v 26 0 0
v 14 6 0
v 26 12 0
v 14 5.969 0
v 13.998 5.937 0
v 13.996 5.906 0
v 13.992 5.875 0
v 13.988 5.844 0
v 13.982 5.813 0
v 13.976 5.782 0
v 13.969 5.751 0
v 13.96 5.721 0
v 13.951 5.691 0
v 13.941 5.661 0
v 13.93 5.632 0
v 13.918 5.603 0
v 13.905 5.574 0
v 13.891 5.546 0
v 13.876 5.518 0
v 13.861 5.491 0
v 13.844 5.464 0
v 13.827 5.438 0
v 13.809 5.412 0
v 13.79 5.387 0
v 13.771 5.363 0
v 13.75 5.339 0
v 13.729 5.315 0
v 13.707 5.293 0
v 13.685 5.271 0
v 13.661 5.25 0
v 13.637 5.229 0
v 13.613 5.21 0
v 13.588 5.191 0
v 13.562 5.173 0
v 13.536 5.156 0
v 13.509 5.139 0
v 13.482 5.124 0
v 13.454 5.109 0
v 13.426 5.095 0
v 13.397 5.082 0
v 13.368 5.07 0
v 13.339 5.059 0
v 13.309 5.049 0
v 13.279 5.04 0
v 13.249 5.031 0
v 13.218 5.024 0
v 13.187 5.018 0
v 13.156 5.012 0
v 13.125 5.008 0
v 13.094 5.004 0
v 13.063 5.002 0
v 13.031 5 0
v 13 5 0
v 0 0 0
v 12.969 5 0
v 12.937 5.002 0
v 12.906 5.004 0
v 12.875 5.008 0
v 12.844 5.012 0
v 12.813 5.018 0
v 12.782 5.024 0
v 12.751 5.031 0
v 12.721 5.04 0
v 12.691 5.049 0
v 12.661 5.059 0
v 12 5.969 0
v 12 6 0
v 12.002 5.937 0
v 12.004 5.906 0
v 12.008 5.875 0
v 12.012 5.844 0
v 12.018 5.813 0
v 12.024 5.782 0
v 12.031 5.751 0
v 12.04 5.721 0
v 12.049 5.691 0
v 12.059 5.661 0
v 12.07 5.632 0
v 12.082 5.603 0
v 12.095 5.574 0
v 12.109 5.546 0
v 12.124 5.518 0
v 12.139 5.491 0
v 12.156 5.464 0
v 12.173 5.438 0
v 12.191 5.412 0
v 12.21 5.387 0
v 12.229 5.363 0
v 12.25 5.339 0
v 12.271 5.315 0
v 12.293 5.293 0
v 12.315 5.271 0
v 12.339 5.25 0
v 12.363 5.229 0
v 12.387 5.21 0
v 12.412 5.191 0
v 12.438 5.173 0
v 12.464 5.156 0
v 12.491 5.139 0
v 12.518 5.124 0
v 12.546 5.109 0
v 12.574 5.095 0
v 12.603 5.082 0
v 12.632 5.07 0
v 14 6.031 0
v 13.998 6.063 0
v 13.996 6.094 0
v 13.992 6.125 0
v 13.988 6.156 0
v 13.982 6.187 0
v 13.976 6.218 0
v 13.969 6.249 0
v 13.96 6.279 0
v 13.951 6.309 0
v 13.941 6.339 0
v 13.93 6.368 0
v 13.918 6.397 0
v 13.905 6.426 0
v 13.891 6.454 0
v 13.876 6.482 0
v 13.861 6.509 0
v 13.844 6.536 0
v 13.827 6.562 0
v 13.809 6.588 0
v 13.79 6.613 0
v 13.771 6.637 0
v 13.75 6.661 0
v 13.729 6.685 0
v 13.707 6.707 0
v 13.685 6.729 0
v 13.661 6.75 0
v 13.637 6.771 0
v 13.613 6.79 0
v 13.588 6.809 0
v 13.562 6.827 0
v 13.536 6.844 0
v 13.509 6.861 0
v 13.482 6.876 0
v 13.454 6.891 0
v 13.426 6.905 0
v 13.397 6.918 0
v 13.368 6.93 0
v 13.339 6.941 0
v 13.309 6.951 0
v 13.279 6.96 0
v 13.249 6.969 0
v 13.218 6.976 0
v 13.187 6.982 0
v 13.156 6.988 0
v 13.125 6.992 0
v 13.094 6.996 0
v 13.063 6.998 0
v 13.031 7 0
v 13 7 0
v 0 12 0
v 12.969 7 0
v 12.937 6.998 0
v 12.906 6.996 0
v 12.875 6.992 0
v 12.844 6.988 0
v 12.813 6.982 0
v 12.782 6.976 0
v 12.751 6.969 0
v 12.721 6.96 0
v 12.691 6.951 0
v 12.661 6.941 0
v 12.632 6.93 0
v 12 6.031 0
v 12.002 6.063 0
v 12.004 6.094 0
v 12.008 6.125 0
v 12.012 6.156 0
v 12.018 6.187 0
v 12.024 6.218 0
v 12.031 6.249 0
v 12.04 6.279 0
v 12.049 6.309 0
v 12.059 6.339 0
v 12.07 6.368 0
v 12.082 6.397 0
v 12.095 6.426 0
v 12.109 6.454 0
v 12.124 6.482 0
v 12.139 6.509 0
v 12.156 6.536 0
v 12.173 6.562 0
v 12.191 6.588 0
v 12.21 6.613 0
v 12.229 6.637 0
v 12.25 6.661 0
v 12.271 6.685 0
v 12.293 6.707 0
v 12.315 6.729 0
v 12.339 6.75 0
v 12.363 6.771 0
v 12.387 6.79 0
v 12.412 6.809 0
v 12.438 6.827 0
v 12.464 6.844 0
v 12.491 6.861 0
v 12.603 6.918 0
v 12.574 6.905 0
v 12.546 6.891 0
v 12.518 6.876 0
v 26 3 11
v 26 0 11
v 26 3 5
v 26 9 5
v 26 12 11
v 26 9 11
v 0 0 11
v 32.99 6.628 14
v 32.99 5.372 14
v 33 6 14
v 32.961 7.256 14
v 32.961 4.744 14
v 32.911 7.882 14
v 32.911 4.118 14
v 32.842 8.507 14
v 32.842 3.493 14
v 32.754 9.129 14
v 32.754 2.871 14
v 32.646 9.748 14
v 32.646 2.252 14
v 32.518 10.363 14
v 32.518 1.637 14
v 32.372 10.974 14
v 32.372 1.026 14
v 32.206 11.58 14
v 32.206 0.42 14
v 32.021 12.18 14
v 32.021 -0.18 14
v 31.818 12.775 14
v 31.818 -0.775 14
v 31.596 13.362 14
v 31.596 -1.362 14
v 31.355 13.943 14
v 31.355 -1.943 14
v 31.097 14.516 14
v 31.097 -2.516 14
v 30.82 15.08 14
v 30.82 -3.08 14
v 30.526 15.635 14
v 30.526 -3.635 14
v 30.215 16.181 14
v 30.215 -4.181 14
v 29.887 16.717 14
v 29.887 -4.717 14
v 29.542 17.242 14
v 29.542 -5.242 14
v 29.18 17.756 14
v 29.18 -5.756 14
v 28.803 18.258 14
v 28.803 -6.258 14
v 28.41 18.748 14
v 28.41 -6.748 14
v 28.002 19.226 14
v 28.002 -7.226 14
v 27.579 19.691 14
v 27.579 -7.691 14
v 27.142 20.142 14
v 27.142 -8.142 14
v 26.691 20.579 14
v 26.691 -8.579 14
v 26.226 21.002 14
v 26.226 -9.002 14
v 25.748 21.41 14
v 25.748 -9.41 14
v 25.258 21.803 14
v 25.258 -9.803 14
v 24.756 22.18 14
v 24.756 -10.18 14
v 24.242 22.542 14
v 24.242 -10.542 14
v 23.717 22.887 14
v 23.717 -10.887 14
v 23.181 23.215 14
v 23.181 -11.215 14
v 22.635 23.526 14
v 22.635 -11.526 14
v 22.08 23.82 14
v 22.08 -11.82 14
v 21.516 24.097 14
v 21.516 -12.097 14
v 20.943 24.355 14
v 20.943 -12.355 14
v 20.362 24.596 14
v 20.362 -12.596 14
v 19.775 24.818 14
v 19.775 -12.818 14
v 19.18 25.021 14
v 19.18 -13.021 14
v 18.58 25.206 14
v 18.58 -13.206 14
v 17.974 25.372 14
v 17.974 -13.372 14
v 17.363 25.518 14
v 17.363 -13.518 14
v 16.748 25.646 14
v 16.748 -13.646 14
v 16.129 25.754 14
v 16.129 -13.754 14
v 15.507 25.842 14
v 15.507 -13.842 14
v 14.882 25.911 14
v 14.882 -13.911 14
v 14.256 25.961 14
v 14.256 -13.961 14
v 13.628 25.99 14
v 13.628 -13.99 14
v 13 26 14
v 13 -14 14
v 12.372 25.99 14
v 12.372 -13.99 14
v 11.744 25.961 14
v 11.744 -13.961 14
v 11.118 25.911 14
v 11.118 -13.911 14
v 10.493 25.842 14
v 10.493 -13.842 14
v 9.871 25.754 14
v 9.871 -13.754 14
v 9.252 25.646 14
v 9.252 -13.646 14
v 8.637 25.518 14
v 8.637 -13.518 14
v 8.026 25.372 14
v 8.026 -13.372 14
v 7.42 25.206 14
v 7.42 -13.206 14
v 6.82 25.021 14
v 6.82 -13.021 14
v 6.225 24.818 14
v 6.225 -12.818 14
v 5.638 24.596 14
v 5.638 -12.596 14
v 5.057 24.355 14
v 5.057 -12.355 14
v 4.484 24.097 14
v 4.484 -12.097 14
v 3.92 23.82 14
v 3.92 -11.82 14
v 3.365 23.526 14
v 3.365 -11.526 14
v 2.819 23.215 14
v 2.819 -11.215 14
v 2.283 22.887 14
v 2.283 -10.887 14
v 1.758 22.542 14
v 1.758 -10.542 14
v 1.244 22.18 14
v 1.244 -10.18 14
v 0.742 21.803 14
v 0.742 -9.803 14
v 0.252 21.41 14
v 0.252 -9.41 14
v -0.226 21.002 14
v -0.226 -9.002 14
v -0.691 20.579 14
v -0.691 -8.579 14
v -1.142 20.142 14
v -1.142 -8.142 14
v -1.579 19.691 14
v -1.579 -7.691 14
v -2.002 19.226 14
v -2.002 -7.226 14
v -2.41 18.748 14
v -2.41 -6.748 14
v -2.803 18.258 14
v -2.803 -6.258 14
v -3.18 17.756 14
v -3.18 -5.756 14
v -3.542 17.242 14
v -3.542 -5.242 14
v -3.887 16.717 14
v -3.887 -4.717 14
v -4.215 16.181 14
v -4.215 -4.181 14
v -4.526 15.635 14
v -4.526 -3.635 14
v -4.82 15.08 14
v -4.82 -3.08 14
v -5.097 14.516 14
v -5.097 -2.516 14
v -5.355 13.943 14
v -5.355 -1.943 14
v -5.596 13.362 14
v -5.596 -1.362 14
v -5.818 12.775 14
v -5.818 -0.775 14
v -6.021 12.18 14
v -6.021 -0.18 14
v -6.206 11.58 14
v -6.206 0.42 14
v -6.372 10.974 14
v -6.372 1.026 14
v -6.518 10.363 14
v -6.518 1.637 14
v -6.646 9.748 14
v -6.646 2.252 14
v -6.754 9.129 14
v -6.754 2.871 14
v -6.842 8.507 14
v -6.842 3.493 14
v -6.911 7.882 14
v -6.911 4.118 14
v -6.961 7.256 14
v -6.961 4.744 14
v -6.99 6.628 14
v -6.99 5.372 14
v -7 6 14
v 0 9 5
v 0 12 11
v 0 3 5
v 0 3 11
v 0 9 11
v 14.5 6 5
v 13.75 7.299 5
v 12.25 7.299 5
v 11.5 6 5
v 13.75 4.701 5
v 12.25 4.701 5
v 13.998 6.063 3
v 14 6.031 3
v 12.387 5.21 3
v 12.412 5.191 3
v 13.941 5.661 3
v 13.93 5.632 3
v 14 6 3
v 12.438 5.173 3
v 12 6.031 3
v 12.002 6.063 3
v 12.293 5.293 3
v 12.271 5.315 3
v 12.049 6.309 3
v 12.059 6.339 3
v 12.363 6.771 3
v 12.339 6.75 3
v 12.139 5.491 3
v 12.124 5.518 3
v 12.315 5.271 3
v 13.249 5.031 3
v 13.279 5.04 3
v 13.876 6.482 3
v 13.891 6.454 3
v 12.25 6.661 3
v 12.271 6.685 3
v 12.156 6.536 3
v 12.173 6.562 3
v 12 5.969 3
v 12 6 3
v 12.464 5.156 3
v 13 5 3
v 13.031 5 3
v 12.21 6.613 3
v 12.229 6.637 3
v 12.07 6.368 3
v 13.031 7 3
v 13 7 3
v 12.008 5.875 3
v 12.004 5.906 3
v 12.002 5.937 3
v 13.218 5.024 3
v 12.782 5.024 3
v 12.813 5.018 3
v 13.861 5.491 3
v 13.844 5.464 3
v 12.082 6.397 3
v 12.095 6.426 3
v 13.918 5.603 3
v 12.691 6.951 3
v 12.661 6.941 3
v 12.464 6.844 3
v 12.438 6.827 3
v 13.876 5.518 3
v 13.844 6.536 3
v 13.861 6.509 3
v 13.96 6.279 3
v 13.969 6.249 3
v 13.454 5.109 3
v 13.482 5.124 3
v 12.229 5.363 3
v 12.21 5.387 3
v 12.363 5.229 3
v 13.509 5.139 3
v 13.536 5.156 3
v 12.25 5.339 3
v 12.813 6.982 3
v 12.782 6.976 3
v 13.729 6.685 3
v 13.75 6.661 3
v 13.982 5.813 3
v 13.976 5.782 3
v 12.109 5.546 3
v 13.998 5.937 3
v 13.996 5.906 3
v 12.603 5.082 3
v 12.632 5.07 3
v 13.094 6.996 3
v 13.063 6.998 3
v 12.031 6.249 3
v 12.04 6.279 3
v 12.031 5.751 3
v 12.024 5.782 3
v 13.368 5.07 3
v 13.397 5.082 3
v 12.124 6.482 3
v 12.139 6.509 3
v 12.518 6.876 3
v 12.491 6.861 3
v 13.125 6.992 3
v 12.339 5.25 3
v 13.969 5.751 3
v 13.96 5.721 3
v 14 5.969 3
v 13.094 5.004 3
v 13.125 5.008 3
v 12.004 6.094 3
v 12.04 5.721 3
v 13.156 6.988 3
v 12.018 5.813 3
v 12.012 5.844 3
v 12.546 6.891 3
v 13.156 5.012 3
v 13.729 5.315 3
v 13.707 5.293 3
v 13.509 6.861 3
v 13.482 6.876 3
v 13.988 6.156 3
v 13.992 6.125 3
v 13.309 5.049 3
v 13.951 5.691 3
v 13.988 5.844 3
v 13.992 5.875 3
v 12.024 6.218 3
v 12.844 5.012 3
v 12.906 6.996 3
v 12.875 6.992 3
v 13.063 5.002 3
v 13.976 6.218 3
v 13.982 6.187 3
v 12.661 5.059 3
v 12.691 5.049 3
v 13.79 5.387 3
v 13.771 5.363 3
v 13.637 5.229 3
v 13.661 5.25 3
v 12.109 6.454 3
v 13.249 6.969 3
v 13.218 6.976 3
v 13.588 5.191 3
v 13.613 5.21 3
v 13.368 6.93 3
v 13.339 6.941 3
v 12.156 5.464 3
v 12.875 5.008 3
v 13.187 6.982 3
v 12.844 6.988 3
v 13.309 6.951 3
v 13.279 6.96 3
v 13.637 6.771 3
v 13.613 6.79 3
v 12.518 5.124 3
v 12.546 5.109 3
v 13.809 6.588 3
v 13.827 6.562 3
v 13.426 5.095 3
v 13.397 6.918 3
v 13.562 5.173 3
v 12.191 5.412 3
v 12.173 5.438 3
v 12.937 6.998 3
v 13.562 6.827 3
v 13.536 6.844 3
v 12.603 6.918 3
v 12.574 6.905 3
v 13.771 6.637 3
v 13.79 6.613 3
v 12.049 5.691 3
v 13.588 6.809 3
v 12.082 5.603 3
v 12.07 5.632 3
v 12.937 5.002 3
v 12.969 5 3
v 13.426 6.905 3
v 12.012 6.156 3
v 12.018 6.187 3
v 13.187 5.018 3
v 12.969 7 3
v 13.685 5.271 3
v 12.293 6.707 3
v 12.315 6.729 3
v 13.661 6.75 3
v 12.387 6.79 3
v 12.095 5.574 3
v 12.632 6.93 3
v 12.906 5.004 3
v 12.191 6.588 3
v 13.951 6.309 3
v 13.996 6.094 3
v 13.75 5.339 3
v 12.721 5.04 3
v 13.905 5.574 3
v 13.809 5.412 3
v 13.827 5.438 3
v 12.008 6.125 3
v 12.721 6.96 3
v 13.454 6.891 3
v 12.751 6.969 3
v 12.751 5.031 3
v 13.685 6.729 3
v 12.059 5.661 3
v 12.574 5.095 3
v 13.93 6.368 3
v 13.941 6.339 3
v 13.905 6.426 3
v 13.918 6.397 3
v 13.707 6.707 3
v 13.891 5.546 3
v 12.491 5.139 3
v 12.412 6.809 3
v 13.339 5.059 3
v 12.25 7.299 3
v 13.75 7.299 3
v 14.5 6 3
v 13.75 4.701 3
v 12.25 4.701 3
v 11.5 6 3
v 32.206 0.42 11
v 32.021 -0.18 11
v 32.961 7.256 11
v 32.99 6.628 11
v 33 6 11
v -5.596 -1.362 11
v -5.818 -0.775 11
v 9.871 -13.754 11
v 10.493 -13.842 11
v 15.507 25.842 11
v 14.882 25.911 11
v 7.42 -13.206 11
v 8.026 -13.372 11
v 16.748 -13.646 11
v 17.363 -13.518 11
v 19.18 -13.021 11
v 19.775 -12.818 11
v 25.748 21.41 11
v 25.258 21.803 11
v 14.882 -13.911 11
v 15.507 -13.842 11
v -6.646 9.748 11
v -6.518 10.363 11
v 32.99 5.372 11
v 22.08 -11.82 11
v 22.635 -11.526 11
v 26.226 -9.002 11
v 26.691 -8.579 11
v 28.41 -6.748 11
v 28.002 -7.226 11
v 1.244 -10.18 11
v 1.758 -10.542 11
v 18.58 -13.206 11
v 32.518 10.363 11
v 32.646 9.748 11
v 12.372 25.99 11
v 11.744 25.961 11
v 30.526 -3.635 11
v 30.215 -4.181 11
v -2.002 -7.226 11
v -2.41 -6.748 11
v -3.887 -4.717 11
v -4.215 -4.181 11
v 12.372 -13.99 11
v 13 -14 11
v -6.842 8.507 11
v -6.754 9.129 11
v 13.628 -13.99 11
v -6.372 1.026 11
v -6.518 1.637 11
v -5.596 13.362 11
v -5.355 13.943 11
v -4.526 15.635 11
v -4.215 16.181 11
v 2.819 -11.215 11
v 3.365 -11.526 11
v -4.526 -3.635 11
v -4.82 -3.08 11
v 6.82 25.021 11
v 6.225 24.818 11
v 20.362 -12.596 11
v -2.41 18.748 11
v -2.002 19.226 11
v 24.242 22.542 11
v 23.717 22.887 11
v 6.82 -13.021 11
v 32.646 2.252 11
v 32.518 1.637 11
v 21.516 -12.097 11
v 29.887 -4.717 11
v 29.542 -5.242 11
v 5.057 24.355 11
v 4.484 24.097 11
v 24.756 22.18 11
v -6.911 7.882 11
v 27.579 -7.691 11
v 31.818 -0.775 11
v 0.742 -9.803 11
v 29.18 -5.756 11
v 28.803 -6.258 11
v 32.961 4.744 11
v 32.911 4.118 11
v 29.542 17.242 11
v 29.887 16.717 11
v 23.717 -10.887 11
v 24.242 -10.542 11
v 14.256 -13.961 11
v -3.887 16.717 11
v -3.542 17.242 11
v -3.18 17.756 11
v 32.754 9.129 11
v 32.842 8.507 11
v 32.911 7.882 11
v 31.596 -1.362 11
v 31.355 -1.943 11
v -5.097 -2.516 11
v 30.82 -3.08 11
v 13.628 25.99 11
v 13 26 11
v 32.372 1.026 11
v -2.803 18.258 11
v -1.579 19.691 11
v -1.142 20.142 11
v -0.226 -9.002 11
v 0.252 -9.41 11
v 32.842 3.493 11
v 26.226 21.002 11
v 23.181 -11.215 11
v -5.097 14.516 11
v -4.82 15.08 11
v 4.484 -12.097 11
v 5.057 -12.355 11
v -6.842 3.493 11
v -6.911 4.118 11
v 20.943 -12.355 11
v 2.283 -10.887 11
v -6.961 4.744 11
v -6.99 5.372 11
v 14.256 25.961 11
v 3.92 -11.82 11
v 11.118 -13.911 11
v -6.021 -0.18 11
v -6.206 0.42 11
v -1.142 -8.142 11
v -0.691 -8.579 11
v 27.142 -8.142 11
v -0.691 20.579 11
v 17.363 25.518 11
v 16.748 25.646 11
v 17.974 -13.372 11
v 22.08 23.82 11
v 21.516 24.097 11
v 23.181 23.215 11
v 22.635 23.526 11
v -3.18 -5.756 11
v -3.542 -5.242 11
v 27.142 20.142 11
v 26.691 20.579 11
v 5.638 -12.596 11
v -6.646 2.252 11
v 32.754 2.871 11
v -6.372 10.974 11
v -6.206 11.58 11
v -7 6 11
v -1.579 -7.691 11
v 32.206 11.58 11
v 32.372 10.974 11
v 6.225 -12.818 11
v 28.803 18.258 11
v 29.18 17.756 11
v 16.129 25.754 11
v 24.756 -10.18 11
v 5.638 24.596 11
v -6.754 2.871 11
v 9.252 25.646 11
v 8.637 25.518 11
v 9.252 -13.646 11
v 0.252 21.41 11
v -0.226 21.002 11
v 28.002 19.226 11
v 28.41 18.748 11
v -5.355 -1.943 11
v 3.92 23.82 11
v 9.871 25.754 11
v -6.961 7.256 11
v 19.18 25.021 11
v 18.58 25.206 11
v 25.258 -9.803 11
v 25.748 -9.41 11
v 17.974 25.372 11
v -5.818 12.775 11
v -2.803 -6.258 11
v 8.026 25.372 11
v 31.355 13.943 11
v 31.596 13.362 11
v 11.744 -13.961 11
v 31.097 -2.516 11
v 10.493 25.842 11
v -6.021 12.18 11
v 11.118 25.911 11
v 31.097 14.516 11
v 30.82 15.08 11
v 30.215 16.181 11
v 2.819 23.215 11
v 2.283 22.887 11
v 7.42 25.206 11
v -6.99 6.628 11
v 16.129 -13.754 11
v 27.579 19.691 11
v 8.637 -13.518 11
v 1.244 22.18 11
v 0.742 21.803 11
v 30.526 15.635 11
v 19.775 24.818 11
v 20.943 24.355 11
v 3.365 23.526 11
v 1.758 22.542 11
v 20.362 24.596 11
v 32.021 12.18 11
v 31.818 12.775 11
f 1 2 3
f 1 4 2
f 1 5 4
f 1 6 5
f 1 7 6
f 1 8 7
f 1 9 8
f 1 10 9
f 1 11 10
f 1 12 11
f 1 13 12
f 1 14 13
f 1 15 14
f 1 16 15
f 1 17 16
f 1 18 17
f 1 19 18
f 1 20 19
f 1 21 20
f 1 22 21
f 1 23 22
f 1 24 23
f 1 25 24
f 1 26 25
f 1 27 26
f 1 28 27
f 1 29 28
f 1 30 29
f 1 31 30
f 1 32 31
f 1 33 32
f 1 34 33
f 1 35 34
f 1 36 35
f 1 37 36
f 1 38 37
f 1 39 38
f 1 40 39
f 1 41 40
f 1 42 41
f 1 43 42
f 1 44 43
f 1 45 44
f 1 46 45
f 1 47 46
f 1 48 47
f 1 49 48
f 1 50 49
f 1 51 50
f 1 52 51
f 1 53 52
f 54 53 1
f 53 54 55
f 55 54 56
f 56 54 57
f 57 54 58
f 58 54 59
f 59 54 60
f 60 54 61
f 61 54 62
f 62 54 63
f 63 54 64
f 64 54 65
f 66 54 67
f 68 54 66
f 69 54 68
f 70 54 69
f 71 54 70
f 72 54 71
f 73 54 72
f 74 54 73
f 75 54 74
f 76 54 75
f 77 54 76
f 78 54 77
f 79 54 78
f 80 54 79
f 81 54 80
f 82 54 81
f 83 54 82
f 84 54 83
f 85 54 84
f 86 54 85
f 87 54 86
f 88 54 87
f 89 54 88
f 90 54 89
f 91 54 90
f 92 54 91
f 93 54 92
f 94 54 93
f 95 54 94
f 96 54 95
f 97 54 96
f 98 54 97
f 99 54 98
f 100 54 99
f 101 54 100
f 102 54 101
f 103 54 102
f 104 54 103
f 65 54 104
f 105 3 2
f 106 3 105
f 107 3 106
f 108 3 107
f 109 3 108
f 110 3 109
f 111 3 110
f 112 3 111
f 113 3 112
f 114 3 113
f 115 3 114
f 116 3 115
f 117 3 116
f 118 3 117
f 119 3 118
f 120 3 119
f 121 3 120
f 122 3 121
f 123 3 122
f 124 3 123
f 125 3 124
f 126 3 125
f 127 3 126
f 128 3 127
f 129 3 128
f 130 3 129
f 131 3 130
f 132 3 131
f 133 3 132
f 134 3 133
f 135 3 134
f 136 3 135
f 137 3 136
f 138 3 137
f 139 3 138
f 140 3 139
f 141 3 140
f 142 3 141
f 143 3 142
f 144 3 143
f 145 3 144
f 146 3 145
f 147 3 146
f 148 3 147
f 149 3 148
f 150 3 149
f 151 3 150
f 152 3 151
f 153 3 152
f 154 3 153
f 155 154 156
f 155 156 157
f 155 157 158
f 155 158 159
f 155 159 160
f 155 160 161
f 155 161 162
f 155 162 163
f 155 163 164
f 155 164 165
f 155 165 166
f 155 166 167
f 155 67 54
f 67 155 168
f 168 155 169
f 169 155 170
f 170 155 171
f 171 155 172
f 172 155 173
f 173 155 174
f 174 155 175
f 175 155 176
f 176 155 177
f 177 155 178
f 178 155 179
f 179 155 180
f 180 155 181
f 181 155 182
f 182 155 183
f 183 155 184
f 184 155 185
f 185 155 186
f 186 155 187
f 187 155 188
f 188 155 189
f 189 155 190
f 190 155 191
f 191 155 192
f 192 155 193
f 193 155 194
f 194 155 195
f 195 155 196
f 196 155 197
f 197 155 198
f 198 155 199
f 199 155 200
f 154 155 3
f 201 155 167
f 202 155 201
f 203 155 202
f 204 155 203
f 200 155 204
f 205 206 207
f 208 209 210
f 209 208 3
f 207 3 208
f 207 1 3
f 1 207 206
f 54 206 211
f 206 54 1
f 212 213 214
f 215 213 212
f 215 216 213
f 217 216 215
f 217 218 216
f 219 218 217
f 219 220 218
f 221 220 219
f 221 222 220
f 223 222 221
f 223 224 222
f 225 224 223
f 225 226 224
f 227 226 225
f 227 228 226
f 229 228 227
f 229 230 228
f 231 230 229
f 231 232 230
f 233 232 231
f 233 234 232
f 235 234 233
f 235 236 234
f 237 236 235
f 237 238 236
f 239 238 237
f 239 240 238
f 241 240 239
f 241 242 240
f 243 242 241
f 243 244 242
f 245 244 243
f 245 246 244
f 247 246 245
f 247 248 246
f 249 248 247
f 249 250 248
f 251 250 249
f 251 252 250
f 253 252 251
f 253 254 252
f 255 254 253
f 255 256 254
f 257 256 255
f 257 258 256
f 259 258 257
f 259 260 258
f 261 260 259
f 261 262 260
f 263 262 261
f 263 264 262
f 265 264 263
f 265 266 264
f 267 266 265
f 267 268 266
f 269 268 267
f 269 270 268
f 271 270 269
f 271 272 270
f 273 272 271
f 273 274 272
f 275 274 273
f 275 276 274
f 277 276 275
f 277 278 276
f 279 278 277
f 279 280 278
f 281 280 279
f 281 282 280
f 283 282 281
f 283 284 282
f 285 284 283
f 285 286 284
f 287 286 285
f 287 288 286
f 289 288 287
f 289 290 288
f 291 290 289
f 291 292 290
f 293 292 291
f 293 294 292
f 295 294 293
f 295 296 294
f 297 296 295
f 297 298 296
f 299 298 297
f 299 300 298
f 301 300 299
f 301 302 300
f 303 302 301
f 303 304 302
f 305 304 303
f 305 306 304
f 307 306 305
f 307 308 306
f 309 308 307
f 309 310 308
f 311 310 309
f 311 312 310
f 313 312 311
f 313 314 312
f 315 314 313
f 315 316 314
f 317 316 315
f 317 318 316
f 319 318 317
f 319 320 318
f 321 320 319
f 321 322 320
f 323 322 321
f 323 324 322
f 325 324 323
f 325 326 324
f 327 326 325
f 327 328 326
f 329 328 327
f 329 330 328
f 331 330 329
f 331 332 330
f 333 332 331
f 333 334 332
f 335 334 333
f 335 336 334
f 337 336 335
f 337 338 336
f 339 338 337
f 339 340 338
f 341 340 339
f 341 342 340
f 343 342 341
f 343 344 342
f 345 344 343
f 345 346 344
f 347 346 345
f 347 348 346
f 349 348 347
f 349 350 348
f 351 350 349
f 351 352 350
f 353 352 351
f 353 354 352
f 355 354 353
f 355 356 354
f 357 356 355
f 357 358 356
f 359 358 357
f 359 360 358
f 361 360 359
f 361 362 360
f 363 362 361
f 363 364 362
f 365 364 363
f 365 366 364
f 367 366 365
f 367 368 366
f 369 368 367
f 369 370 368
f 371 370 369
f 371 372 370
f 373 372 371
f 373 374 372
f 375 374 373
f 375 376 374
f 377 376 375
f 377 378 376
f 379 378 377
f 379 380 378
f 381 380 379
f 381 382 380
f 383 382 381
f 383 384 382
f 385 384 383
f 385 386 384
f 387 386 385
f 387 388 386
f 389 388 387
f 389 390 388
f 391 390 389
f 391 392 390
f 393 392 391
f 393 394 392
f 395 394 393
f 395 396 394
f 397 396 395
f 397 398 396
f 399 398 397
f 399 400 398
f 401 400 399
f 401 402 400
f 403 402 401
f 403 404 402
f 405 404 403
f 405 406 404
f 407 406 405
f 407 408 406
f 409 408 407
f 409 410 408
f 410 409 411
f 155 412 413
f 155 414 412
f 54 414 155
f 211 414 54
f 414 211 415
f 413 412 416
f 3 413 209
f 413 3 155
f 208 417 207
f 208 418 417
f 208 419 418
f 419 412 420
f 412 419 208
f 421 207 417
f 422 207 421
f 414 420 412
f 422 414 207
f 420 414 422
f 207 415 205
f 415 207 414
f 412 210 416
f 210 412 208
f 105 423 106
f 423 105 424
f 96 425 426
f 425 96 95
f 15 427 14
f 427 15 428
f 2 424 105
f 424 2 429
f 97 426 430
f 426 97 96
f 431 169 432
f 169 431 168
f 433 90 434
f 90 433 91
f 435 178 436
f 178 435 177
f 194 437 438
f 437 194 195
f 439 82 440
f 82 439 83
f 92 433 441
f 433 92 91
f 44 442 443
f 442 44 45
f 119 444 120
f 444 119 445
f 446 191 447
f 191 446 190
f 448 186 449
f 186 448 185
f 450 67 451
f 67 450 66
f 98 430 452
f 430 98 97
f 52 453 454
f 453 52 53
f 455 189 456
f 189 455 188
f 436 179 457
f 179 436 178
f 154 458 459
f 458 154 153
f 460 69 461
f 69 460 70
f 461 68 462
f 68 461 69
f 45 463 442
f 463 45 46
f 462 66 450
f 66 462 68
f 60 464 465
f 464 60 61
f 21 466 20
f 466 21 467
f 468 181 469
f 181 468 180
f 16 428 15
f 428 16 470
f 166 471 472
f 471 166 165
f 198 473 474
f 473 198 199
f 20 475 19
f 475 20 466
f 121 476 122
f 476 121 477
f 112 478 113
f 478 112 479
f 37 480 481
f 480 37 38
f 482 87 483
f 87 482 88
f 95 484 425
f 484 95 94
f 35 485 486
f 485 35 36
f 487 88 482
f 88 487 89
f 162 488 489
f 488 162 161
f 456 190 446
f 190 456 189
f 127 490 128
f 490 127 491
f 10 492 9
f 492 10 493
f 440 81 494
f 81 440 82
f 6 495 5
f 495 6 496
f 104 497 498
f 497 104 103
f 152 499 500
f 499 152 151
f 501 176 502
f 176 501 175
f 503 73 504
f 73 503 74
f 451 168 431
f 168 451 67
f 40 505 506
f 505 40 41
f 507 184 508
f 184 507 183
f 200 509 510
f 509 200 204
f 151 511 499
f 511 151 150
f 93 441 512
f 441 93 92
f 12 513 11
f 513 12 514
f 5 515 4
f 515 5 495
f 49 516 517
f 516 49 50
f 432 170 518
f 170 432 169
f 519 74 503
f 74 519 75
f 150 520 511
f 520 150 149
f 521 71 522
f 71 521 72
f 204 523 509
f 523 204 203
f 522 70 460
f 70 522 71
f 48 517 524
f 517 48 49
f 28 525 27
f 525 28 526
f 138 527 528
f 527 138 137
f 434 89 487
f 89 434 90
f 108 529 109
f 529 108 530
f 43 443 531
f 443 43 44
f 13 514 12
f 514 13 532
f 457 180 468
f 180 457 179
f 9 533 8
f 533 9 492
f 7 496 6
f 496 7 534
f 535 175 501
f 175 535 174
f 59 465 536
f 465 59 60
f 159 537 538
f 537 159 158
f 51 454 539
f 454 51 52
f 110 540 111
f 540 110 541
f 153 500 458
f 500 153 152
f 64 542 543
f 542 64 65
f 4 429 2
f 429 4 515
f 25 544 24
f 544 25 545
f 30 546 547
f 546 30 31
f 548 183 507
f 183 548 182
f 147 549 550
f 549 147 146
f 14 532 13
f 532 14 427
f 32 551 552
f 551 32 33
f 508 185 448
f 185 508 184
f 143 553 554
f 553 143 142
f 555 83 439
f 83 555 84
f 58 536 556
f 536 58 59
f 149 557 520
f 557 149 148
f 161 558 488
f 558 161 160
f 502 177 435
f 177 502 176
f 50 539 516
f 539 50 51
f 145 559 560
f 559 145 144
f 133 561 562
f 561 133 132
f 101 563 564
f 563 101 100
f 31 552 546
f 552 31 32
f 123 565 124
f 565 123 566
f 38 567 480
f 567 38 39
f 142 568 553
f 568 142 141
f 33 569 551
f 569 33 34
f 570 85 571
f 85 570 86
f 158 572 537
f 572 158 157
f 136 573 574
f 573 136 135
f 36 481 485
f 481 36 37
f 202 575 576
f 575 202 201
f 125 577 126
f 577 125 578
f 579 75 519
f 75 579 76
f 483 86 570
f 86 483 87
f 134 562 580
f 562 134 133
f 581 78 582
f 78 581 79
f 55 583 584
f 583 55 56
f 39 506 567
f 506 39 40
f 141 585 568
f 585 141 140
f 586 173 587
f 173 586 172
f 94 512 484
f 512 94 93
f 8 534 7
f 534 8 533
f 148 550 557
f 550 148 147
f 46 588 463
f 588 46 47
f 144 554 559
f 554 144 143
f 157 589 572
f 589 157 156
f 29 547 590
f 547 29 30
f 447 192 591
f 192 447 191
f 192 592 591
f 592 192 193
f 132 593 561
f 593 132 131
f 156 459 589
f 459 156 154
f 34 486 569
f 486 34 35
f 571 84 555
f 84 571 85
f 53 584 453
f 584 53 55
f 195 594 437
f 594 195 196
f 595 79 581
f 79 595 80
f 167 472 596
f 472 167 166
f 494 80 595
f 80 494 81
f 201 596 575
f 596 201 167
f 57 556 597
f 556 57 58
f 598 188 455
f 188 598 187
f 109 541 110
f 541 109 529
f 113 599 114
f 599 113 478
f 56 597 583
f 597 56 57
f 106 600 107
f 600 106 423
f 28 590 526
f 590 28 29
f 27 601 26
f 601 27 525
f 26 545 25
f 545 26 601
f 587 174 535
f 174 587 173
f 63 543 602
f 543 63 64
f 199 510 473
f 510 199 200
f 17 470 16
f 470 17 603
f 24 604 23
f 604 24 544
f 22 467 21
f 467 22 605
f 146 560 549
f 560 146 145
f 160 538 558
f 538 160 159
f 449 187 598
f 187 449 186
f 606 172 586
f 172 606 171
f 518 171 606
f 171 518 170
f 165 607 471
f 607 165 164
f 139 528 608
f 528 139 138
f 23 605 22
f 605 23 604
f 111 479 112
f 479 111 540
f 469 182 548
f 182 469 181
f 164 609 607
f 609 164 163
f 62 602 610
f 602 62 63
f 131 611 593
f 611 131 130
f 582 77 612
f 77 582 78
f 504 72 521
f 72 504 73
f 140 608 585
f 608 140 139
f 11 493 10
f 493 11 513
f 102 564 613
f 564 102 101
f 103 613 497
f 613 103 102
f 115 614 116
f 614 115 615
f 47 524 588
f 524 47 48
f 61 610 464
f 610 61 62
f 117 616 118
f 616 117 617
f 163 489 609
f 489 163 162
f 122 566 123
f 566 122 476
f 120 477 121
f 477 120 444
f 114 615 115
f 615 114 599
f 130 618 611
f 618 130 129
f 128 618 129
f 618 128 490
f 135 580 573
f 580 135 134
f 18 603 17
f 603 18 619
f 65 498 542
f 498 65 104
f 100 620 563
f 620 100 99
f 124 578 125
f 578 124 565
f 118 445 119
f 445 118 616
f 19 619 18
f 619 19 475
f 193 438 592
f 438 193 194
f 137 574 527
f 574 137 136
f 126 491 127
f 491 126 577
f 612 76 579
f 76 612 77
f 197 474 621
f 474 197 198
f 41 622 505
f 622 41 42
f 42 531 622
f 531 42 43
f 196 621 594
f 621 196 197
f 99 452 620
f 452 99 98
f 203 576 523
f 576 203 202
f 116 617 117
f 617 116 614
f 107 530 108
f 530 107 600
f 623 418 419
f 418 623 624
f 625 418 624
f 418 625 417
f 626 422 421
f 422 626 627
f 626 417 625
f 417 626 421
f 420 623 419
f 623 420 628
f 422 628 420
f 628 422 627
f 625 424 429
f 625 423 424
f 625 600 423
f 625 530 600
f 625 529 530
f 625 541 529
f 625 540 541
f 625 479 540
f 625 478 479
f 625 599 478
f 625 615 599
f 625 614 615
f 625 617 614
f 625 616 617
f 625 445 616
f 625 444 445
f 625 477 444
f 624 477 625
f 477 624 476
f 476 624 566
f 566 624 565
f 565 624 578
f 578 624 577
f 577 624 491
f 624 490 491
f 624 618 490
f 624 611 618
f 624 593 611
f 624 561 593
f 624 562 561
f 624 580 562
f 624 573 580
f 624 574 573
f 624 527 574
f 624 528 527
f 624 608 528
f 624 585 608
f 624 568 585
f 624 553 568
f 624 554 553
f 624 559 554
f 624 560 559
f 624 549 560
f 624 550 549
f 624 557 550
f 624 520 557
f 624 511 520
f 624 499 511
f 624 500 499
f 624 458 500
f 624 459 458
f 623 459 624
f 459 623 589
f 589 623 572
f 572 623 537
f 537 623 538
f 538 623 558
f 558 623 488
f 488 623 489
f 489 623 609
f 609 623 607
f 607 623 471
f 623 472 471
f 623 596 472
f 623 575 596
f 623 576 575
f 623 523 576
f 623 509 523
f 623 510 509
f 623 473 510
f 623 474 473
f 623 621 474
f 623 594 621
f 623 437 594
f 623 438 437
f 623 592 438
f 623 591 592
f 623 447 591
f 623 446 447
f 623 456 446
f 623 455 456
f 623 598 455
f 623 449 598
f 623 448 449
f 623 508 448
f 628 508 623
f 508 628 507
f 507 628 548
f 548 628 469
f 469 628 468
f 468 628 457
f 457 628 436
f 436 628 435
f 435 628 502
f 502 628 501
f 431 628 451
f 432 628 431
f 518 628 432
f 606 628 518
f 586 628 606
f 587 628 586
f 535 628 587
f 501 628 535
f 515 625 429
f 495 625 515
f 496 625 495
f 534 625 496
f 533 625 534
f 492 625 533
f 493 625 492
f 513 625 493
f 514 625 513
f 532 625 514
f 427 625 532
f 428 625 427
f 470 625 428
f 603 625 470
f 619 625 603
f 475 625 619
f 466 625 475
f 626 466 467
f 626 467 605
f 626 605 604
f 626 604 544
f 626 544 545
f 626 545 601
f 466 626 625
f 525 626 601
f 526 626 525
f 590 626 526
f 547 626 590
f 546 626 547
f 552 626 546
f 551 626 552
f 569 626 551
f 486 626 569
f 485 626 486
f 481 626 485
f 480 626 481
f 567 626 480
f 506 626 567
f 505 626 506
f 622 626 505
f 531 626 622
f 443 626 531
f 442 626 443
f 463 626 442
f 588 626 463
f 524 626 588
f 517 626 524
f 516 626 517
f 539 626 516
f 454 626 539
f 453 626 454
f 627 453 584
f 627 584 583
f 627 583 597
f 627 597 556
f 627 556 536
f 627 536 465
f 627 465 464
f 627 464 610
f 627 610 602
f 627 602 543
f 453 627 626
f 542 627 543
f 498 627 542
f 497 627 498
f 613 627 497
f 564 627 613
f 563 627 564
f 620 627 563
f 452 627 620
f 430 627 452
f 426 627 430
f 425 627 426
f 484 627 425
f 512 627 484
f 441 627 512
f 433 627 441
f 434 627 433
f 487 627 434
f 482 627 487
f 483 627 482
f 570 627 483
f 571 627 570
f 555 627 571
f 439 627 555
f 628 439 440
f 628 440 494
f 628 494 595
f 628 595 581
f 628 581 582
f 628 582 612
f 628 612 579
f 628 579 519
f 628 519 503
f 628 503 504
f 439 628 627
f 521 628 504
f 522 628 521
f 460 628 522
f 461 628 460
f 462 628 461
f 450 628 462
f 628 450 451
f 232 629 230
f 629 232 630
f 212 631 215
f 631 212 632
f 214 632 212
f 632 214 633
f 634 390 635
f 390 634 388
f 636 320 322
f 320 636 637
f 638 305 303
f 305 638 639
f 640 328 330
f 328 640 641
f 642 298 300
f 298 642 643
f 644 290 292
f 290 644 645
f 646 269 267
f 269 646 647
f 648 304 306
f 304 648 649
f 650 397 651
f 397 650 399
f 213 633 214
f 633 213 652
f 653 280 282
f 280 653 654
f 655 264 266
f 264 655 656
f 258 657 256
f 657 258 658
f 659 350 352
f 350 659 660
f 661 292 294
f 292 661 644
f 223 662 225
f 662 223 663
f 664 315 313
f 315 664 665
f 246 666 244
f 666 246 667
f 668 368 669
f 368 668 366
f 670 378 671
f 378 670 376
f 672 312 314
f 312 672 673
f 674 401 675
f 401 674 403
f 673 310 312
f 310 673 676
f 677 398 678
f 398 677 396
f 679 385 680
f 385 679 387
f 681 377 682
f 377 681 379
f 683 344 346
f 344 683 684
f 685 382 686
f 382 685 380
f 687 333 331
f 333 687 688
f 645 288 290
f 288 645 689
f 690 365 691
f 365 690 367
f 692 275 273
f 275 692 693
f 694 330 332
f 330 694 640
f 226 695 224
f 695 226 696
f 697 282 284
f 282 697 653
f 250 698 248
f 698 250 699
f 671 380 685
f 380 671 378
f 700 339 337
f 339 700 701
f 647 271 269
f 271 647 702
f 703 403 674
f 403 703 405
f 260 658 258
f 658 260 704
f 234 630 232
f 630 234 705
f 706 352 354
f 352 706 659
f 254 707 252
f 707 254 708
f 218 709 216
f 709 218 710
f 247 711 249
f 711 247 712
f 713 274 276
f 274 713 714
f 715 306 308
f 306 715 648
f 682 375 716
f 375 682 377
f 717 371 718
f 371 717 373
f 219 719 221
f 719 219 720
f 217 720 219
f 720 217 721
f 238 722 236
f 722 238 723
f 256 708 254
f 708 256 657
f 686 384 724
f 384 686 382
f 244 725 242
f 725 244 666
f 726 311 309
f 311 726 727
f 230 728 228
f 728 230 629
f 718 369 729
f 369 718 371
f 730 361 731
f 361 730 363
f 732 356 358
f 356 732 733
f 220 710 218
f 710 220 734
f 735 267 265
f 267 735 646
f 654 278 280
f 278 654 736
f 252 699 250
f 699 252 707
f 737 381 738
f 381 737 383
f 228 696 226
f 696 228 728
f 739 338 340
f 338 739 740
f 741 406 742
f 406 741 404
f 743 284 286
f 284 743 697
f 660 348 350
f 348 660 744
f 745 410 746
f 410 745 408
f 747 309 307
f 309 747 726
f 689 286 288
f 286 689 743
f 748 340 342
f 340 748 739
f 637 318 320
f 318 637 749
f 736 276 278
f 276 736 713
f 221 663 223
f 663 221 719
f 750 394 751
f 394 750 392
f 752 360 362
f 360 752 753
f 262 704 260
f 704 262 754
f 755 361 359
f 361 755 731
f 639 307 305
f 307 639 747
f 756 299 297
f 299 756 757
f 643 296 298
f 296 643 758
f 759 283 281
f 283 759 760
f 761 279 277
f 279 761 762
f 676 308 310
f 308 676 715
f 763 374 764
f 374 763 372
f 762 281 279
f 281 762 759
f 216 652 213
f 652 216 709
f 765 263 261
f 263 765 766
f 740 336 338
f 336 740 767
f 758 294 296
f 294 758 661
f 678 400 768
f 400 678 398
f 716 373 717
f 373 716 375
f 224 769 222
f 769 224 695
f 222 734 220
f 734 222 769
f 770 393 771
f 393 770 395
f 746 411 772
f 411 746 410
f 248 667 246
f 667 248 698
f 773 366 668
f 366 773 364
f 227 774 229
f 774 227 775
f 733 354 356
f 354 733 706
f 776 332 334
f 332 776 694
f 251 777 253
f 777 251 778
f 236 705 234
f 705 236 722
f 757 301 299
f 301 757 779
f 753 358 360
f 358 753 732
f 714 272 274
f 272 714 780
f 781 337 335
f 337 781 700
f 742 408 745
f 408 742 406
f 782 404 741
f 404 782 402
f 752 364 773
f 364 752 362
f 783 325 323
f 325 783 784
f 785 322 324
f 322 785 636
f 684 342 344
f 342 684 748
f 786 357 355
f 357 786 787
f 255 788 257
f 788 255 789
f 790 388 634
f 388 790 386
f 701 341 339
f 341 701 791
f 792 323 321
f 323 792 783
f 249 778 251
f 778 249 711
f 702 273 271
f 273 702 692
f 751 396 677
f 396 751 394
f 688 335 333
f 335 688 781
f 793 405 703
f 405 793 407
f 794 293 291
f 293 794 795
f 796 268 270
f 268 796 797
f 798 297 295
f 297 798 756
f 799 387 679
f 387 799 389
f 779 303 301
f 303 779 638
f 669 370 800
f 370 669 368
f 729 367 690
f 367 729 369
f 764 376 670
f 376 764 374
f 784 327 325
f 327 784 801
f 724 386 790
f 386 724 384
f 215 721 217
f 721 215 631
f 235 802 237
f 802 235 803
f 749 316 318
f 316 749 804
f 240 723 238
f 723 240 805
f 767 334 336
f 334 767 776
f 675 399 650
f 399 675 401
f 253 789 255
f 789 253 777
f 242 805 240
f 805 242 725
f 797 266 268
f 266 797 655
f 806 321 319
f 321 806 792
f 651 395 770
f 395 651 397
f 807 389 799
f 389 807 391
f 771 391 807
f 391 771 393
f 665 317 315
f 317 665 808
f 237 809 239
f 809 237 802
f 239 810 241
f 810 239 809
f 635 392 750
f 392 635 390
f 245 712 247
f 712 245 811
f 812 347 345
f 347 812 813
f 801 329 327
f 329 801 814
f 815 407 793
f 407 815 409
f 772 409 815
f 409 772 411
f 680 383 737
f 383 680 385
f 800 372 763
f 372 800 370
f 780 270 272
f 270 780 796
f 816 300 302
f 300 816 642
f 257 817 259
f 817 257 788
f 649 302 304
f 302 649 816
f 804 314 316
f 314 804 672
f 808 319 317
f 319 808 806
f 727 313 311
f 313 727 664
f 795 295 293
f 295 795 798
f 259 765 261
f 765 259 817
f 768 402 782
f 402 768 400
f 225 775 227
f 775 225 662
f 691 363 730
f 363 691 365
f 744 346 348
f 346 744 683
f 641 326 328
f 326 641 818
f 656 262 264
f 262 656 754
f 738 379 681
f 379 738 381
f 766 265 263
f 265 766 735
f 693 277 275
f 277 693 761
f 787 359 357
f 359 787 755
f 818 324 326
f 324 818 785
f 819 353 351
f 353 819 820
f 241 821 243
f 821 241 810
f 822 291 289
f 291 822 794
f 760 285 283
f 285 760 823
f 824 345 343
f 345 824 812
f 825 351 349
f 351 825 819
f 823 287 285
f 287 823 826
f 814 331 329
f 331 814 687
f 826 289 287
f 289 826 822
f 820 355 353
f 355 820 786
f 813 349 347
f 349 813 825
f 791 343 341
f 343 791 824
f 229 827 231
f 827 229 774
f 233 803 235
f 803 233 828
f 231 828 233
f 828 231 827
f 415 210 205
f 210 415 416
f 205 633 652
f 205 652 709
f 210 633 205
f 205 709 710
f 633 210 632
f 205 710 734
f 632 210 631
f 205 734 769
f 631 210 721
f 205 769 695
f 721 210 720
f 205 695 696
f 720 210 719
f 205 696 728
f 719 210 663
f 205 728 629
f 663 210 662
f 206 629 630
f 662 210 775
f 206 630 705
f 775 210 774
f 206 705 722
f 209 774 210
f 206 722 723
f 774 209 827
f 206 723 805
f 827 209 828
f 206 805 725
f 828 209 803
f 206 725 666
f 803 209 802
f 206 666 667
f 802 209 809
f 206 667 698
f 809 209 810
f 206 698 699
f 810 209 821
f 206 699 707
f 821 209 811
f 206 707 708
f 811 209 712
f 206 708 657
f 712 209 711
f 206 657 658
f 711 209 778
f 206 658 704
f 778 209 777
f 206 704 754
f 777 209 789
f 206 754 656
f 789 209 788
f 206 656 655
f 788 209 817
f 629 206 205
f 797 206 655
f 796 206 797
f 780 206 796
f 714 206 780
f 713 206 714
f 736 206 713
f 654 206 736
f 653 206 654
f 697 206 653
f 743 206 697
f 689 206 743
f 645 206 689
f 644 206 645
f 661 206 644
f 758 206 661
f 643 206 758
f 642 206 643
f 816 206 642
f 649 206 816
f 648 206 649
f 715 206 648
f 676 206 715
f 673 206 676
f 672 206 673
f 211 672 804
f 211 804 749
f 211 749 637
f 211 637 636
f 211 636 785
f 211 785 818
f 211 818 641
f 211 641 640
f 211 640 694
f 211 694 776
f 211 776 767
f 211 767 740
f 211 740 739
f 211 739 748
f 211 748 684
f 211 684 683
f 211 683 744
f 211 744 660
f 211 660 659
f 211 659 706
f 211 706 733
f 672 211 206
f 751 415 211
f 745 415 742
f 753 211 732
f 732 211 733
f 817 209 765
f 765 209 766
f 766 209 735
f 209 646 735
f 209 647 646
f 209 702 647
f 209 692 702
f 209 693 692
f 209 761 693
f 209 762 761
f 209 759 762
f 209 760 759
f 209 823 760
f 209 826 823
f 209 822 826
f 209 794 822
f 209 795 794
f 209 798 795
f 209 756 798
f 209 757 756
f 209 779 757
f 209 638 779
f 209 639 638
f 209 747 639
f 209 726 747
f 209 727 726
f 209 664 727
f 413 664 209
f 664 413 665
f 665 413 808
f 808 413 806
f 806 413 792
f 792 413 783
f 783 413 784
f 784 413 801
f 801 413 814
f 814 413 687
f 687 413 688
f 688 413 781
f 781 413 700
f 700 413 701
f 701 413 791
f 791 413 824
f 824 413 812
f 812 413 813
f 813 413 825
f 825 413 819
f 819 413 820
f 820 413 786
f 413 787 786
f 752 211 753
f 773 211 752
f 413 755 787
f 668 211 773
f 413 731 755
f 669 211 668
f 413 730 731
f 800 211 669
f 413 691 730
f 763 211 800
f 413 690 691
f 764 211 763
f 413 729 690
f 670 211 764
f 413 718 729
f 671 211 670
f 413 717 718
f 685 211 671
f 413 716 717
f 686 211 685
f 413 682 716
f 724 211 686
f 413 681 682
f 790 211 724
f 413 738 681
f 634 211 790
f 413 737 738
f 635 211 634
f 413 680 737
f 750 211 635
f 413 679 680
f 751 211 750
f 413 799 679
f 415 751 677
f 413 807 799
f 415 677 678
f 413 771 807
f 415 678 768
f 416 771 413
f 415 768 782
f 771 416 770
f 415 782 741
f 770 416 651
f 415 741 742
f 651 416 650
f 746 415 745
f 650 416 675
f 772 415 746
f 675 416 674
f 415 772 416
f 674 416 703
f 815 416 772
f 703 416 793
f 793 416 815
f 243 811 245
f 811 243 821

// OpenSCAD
// Dimensions de la pièces

rayonTige = 3;
epaisseur = 3;
epaisseurSup = 5;
longeur = 20;
rayonVis = 1;
rayonEcrou = 1.5;

// Module pave

module pave(longeurPave,largeurPave,hauteurPave)
{
    linear_extrude(hauteurPave)
    {
        polygon(points = [[0,0],[longeurPave,0],[longeurPave,largeurPave],[0,largeurPave]]);
    }
}


// Module de la pince
module pince()
{
difference()
{
    pave(longeur+2*epaisseur,2*(rayonTige+epaisseur),2*rayonTige+epaisseur+epaisseurSup);
    translate([-epaisseur,epaisseur,epaisseurSup])
    {
        pave(longeur+4*epaisseur,2*rayonTige,2*rayonTige+epaisseur+epaisseurSup);
    };
    
    translate([longeur/2 + epaisseur, rayonTige+epaisseur, -epaisseur])
    {
        linear_extrude(50)
        {
            circle(rayonVis, $fn = 200);
        };
    };
    
    translate([longeur/2 + epaisseur, rayonTige+epaisseur, epaisseur])
    {
        linear_extrude(50)
        {
            circle(rayonEcrou, $fn = 6);
        };
    };
}
}

// Pièce finale

union()
{
    pince();
    translate([longeur/2 + epaisseur, rayonTige+epaisseur,epaisseurSup+2*rayonTige])
    {
        linear_extrude(epaisseur)
        {
            circle(20,$fn = 200);
        }
    }
}
